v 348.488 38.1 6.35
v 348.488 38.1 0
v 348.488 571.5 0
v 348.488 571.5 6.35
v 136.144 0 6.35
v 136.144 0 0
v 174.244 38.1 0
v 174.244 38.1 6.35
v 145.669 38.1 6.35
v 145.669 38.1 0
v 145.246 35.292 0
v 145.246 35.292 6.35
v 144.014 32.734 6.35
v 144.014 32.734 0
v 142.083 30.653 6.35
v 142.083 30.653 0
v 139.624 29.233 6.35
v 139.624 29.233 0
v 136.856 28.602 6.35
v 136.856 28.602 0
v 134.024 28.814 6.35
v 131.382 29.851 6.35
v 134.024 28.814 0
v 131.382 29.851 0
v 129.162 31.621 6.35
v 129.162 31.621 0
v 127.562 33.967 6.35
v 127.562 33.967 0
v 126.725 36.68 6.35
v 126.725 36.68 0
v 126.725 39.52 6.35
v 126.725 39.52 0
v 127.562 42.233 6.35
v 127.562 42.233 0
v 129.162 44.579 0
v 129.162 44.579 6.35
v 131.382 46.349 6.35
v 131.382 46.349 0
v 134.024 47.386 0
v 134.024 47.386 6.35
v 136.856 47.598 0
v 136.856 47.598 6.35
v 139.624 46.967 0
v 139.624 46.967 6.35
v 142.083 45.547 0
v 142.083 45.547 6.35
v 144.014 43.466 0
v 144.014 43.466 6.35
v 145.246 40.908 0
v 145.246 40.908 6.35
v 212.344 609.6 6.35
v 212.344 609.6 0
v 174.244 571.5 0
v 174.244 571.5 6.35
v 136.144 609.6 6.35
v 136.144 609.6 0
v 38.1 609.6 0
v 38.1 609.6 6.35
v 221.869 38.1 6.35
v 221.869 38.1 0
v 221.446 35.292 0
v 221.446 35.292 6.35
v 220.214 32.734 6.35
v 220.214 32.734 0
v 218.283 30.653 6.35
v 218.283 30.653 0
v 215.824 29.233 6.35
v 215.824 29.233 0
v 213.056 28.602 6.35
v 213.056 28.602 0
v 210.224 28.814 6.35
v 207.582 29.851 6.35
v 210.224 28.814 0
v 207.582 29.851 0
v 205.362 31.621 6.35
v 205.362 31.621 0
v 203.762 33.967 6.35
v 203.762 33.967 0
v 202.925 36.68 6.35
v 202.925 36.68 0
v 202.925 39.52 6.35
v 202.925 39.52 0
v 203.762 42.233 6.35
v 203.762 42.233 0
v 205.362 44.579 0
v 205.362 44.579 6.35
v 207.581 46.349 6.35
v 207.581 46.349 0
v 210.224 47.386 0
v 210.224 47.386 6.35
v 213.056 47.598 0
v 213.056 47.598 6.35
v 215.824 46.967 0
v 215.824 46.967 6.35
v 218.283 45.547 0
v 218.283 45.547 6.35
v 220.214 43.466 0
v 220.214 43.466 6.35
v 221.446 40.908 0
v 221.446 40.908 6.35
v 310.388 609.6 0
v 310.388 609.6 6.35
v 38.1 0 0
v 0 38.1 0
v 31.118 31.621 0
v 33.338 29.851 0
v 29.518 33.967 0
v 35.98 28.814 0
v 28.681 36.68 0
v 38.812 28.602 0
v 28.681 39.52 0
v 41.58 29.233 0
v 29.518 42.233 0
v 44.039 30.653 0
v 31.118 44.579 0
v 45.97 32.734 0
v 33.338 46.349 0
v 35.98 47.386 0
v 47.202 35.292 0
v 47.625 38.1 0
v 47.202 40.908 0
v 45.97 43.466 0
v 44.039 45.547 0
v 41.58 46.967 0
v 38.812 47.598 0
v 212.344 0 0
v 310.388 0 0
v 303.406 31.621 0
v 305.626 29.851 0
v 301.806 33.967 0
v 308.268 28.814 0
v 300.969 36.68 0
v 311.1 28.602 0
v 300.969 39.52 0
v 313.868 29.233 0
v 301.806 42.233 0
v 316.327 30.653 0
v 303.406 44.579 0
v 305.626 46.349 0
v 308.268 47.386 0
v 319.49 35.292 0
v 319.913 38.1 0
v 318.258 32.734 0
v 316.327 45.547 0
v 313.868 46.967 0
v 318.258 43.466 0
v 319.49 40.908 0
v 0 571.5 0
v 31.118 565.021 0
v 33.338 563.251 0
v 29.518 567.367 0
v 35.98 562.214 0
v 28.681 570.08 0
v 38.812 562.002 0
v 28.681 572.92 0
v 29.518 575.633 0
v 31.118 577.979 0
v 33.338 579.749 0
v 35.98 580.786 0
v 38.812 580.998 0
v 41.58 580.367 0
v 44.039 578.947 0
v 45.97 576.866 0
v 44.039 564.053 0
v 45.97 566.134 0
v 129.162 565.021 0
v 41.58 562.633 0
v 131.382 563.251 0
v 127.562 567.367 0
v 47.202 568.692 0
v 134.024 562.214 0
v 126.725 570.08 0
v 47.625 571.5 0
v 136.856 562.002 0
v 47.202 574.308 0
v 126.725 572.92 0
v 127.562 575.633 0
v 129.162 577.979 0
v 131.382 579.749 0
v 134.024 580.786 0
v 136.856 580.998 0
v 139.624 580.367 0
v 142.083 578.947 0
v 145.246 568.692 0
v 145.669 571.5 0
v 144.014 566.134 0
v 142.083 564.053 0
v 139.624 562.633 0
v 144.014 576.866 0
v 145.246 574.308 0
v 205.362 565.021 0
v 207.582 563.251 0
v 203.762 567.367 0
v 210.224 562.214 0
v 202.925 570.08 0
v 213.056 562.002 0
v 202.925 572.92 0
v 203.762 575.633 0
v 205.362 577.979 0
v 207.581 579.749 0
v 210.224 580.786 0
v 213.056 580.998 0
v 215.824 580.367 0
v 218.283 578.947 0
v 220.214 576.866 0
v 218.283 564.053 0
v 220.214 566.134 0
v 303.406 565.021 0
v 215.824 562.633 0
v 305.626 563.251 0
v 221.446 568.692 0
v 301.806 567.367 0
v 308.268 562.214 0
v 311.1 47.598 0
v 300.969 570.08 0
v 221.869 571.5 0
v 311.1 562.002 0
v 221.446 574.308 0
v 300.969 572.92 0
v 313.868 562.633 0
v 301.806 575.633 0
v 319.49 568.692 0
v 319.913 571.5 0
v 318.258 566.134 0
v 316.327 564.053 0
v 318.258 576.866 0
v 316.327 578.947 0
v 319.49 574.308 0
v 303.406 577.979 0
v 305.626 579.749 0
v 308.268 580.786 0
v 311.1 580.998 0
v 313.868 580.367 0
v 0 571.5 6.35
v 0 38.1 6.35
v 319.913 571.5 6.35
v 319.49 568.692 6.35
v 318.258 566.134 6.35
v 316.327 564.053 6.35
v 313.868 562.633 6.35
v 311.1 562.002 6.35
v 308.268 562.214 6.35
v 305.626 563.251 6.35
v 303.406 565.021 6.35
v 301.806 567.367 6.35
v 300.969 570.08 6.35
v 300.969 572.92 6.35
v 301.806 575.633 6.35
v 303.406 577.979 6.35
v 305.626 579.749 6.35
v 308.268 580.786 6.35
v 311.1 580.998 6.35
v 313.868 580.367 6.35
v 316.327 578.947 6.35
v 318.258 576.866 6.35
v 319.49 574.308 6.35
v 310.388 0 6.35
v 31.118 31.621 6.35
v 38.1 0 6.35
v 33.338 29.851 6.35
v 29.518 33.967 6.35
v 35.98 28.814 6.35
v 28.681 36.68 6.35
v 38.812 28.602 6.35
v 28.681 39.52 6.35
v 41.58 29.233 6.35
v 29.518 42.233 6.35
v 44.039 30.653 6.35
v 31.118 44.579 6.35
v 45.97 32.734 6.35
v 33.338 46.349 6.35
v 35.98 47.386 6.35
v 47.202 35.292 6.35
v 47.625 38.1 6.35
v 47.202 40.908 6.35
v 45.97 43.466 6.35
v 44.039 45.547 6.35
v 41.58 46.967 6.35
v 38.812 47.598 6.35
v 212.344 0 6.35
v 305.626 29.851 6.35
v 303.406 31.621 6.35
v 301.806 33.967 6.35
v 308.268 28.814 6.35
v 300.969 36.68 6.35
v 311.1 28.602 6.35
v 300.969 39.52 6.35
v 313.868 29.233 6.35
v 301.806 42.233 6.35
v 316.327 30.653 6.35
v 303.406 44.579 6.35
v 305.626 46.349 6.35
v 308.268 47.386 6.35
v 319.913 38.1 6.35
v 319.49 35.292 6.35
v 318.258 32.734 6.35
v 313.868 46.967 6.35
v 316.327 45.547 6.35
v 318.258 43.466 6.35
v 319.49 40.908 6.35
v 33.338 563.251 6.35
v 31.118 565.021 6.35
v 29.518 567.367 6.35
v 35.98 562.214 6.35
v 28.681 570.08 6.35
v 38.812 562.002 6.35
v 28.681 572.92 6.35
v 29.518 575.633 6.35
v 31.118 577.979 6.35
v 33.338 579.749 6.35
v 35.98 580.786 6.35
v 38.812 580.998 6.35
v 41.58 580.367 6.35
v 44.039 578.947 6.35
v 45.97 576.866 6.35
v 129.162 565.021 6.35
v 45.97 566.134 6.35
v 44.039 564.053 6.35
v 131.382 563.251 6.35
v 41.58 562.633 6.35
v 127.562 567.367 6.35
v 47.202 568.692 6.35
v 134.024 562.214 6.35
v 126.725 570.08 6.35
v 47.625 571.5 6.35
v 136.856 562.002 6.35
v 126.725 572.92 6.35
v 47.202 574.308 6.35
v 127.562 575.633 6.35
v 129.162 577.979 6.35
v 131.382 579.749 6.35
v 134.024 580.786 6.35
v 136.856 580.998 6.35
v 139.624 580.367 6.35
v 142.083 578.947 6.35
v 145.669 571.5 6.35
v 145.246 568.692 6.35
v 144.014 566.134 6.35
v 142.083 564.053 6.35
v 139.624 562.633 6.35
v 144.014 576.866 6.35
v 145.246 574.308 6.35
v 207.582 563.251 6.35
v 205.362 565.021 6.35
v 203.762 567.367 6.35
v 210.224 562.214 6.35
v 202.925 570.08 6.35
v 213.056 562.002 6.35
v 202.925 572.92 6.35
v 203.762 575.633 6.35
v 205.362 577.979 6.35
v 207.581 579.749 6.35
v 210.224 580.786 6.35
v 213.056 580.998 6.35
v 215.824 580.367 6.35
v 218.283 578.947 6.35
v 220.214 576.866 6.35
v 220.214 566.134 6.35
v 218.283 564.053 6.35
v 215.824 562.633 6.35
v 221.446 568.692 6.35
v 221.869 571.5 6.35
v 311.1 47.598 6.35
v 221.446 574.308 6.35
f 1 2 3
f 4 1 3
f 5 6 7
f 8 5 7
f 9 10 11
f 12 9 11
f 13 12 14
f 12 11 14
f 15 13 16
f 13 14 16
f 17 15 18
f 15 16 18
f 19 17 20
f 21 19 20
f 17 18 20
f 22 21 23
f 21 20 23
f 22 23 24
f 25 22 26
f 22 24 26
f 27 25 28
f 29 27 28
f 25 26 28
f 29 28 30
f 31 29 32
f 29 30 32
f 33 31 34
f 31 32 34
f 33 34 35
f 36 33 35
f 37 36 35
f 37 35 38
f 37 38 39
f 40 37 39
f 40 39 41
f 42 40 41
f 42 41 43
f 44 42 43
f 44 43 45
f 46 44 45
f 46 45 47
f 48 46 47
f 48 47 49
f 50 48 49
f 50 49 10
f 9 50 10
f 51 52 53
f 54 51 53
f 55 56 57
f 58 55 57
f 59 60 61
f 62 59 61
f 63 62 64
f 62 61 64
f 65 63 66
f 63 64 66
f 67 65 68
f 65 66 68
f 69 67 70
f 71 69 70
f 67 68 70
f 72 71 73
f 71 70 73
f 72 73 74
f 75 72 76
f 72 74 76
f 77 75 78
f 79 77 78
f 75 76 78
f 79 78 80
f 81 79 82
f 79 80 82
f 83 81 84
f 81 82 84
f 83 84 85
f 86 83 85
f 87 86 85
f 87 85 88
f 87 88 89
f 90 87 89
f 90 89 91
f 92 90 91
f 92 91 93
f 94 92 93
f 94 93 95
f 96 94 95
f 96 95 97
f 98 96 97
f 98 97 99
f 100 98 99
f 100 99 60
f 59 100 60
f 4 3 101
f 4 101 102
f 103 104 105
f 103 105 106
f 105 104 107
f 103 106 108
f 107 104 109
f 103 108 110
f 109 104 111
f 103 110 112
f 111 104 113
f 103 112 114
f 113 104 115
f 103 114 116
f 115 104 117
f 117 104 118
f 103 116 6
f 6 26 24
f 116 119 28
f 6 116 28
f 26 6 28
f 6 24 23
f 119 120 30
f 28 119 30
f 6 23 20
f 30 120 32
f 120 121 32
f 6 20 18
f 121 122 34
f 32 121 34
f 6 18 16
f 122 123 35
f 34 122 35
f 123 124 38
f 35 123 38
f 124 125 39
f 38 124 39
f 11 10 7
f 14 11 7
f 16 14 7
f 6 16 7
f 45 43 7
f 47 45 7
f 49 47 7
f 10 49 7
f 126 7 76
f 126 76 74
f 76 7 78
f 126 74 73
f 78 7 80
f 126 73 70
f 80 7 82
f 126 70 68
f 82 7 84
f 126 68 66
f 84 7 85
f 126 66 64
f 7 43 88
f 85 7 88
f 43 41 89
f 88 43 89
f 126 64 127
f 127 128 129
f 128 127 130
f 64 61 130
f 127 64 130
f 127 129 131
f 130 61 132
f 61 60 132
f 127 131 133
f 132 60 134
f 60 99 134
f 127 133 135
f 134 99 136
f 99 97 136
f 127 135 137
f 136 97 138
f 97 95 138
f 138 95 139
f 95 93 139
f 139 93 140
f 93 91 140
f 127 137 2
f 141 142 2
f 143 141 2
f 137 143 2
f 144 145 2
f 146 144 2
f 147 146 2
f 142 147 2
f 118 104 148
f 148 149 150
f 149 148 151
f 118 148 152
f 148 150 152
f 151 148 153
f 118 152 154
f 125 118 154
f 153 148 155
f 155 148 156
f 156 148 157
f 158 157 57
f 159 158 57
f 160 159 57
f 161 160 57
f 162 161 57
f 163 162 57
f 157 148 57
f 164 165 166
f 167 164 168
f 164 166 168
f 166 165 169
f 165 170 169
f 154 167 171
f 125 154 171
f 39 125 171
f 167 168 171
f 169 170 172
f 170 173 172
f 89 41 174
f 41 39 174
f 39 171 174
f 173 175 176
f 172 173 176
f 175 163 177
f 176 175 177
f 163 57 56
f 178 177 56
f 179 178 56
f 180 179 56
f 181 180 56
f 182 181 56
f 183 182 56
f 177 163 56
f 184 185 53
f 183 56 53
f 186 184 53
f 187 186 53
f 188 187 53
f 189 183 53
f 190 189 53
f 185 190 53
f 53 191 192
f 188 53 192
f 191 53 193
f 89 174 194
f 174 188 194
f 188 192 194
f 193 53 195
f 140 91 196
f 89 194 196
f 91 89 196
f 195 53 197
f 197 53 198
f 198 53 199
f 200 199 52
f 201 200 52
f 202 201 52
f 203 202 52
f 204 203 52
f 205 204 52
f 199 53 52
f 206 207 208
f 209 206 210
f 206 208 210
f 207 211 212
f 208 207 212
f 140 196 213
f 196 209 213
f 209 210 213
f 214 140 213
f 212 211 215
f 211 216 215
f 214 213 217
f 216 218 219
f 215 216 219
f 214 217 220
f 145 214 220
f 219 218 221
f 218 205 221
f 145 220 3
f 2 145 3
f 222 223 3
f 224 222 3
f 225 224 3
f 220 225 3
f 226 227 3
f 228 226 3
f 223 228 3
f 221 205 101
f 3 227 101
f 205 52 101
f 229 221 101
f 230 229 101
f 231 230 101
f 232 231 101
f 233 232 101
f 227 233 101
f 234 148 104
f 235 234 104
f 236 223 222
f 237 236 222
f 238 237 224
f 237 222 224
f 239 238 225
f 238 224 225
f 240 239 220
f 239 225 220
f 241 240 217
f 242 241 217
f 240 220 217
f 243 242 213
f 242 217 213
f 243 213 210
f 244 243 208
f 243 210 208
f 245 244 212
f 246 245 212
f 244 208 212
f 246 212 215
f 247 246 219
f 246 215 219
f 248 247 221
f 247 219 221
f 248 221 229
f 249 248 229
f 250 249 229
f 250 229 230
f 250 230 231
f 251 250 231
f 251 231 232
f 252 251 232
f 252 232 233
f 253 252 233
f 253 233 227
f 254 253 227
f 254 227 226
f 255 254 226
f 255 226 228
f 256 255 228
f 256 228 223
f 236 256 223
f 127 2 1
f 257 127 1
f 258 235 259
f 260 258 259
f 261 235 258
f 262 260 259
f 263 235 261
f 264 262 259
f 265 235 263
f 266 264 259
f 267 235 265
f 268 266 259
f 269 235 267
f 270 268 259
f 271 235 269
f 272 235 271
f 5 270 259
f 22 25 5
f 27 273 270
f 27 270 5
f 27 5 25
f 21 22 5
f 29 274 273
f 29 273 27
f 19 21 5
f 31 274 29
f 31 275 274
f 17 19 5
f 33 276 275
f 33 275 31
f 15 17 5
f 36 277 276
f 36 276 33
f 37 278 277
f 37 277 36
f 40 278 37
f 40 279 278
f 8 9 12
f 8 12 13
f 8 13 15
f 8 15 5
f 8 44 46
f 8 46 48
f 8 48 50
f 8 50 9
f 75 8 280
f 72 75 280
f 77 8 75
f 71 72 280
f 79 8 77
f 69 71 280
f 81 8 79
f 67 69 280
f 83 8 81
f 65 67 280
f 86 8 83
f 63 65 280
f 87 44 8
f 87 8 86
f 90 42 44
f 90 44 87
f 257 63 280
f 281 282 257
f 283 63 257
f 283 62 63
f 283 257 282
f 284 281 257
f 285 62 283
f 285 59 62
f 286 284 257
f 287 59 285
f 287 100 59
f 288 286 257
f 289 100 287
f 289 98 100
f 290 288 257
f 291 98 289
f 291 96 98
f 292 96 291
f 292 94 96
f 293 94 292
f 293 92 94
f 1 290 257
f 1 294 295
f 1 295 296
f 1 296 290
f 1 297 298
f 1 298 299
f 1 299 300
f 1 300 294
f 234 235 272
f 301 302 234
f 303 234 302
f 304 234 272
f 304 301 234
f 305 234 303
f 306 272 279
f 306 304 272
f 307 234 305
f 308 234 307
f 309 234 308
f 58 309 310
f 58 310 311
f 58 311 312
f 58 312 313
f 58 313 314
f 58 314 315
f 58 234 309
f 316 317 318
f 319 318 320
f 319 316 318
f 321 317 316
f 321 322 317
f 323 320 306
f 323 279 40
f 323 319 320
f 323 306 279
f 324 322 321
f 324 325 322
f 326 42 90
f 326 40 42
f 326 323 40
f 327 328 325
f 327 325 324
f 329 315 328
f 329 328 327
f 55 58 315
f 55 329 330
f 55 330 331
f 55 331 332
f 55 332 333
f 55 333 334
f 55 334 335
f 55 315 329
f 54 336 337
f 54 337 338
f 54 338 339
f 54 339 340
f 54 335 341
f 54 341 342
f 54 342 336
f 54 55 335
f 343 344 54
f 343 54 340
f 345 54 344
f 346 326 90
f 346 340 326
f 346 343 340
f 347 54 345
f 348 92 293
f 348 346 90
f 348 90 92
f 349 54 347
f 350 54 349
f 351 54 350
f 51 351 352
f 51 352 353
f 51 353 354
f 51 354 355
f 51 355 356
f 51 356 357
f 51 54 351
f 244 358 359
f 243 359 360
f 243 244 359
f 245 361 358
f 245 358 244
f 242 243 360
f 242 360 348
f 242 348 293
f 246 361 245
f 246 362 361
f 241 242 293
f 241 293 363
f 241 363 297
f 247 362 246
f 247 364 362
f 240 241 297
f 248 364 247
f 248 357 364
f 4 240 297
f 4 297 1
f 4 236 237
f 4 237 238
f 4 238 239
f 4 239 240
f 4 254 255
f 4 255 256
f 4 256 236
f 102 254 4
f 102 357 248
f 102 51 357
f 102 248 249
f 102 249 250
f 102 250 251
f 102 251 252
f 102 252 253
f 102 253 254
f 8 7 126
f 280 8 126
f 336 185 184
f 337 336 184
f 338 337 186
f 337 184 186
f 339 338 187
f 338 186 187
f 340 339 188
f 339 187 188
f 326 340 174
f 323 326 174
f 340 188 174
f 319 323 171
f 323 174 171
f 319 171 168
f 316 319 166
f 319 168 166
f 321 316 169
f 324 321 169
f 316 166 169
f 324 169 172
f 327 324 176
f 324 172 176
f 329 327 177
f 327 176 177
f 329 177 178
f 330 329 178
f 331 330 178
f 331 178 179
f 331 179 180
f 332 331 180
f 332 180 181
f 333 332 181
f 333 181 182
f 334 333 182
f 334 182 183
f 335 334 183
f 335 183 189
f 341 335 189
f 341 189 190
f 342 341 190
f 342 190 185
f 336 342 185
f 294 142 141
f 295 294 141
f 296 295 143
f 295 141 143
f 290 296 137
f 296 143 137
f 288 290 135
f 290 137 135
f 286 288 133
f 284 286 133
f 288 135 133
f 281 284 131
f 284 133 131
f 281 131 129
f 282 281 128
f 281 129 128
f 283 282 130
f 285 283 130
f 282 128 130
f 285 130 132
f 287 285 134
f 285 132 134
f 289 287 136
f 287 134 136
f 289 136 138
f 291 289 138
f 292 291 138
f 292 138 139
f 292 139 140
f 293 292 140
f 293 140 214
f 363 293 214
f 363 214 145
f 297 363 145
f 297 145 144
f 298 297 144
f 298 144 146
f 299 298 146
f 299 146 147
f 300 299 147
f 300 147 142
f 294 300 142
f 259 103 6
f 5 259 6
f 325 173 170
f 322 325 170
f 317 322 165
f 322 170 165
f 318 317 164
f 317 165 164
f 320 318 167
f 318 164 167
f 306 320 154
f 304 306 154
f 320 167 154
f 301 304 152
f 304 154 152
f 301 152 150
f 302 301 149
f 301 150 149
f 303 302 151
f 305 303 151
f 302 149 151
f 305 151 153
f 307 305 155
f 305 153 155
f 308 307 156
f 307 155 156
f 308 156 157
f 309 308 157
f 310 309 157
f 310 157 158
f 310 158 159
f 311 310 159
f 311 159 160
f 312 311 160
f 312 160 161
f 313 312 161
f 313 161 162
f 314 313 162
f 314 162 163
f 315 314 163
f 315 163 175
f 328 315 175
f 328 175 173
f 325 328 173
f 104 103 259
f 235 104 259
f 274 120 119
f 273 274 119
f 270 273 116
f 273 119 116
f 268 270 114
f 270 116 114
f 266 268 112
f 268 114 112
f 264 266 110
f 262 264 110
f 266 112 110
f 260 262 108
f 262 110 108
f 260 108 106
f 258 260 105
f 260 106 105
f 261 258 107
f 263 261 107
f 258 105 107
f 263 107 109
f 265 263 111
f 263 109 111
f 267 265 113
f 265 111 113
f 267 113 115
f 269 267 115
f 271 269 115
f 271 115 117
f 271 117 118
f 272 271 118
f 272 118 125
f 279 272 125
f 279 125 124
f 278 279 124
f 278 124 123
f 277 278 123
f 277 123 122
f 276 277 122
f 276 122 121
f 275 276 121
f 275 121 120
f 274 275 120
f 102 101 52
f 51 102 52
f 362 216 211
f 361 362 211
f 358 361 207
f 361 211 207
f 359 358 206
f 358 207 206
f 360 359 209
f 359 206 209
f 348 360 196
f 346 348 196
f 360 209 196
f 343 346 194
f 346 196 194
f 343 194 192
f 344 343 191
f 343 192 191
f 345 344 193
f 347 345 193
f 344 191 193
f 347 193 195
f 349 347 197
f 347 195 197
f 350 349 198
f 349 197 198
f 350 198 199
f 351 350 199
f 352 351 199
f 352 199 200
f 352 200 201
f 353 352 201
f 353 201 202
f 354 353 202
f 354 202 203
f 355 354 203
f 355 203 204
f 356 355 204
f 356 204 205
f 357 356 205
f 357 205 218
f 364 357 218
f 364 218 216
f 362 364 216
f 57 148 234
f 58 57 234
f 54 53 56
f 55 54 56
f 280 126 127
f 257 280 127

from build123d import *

# Parameters (mm, degrees)
F1_DEPTH = 6.35
F2_SIZE  = 38.1
F3_R     = 9.525
F4_DEPTH = 6.351


with BuildPart() as f1:
    # F0 (on Top) → F1 (new body)
    with BuildSketch(Plane.XY):
        Polygon((212.344, 0), (348.488, 0), (348.488, 609.6), (212.344, 609.6), (174.244, 571.5), (136.144, 609.6), (0, 609.6), (0, 0), (136.144, 0), (174.244, 38.1), align=None)
    extrude(amount=F1_DEPTH)

    # F2
    f2_edges = [f1.edges().sort_by_distance(p)[0] for p in [
        (0, 609.6, 3.175),
        (348.488, 609.6, 3.175),
        (348.488, 0, 3.175),
        (0, 0, 3.175),
    ]]
    chamfer(f2_edges, length=F2_SIZE)

    # F3 (on face) → F4 (cut, through all)
    with BuildSketch(Plane(origin=(0, 0, 0), x_dir=(1, 0, 0), z_dir=(0, 0, -1))):
        with Locations((38.1, -571.5)):
            Circle(F3_R)
        with Locations((136.144, -571.5)):
            Circle(F3_R)
        with Locations((212.344, -571.5)):
            Circle(F3_R)
        with Locations((310.388, -571.5)):
            Circle(F3_R)
        with Locations((38.1, -38.1)):
            Circle(F3_R)
        with Locations((136.144, -38.1)):
            Circle(F3_R)
        with Locations((212.344, -38.1)):
            Circle(F3_R)
        with Locations((310.388, -38.1)):
            Circle(F3_R)
    extrude(amount=-F4_DEPTH, mode=Mode.SUBTRACT)


solid = f1.part
